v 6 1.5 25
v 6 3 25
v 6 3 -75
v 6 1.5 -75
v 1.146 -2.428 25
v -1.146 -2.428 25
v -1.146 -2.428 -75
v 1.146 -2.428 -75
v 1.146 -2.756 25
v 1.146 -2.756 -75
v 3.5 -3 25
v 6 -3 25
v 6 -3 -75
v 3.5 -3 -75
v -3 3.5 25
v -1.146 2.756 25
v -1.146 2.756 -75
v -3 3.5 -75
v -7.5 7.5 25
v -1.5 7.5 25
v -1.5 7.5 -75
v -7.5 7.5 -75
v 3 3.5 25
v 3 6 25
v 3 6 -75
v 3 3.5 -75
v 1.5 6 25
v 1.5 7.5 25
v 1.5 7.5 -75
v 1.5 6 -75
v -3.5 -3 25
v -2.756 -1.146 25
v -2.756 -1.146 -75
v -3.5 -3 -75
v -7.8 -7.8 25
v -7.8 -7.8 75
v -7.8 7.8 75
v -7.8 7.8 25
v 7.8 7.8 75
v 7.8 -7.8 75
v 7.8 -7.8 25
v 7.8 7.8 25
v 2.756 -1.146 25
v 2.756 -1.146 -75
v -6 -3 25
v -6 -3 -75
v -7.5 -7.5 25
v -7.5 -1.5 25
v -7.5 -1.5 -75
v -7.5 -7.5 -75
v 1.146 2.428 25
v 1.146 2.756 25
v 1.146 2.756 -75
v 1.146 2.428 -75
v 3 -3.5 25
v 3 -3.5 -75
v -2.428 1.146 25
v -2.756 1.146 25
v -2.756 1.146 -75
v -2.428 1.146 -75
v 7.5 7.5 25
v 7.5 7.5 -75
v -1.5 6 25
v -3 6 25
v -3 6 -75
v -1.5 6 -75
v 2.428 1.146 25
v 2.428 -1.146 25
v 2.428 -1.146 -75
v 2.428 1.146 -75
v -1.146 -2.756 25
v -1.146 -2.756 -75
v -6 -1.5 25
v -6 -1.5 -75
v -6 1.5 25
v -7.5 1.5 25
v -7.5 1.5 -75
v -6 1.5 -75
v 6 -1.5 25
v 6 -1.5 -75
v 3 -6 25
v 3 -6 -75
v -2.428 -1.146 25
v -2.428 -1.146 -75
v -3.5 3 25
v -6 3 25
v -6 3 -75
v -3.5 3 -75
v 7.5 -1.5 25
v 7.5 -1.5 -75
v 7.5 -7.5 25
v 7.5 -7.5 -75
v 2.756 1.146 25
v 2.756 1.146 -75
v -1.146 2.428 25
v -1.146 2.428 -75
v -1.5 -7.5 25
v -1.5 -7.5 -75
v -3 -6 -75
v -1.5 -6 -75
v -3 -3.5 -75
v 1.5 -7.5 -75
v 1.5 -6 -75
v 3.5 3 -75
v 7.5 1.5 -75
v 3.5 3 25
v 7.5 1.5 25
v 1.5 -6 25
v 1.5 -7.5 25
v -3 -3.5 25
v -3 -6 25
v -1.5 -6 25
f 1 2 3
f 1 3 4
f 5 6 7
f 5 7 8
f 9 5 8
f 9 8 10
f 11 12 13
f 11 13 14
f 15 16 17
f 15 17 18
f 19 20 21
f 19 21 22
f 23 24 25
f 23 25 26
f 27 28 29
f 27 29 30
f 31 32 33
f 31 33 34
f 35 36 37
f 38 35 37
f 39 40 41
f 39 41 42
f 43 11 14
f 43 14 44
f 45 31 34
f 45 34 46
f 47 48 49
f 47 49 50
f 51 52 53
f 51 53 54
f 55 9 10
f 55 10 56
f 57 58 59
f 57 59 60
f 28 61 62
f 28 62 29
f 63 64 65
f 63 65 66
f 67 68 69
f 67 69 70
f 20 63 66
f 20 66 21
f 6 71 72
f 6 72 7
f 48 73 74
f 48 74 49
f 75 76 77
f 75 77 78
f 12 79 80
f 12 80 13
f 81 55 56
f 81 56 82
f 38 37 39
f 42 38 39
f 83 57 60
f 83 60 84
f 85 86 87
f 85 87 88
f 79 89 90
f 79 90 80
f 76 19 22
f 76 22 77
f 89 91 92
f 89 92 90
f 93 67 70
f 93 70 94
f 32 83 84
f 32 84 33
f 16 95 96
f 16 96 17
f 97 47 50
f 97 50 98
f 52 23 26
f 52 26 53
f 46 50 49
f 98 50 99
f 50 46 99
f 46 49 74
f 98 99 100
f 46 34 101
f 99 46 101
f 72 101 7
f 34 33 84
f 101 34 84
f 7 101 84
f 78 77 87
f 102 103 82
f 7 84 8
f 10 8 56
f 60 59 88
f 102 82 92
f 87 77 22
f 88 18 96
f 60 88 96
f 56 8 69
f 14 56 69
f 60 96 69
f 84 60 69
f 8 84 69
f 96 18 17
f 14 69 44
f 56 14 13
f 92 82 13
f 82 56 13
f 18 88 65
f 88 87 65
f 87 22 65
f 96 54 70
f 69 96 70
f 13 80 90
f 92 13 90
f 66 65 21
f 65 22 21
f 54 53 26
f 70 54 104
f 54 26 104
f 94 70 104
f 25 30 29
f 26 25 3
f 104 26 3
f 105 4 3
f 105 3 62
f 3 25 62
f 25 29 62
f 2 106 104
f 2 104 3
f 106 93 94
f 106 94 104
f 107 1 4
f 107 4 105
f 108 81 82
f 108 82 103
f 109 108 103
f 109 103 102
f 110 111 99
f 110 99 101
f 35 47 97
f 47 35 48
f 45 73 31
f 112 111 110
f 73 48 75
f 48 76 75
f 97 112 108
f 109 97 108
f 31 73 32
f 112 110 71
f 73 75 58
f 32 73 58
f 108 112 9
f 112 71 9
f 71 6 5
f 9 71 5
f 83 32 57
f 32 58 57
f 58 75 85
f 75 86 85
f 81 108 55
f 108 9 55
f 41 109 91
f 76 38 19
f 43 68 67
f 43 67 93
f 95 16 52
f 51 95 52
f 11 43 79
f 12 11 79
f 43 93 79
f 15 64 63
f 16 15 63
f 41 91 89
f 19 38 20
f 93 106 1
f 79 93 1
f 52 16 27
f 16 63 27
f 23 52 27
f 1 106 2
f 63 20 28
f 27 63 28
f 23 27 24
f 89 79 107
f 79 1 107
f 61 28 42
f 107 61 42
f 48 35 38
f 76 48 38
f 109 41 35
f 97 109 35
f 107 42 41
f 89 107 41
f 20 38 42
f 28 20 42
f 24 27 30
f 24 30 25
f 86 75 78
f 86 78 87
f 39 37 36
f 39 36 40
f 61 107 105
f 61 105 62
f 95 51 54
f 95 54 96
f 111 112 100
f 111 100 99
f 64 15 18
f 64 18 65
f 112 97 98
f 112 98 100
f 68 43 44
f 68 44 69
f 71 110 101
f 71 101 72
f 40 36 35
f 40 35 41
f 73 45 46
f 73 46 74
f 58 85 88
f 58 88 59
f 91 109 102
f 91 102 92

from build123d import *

# Parameters (mm, degrees)
F1_DEPTH = 75
F2_W     = 15.6
F2_H     = 15.6
F3_DEPTH = 50


# Not quite as in the source:
# - ends of sketch curves that miss each other by under 0.0002 mm in the source are joined


with BuildPart() as f1:
    # F0 (on Top) → F1 (new body, symmetric)
    with BuildSketch(Plane.XY):
        Polygon((7.5, 1.5), (7.5, 7.5), (1.5, 7.5), (1.5, 6), (3, 6), (3, 3.5), (1.1461396934, 2.7563427575), (1.1461396934, 2.42764467), (-1.1461396934, 2.42764467), (-1.1461396934, 2.7563427575), (-3, 3.5), (-3, 6), (-1.5, 6), (-1.5, 7.5), (-7.5, 7.5), (-7.5, 1.5), (-6, 1.5), (-6, 3), (-3.5, 3), (-2.7563427575, 1.1461396934), (-2.42764467, 1.1461396934), (-2.42764467, -1.1461396934), (-2.7563427575, -1.1461396934), (-3.5, -3), (-6, -3), (-6, -1.5), (-7.5, -1.5), (-7.5, -7.5), (-1.5, -7.5), (-1.5, -6), (-3, -6), (-3, -3.5), (-1.1461396934, -2.7563427575), (-1.1461396934, -2.42764467), (1.1461396934, -2.42764467), (1.1461396934, -2.7563427575), (3, -3.5), (3, -6), (1.5, -6), (1.5, -7.5), (7.5, -7.5), (7.5, -1.5), (6, -1.5), (6, -3), (3.5, -3), (2.7563427575, -1.1461396934), (2.42764467, -1.1461396934), (2.42764467, 1.1461396934), (2.7563427575, 1.1461396934), (3.5, 3), (6, 3), (6, 1.5), align=None)
    extrude(amount=F1_DEPTH, both=True)

    # F2 (on face) → F3 (join)
    with BuildSketch(Plane.XY.offset(75)):
        Rectangle(F2_W, F2_H)
        Polygon((7.5, 7.5), (7.5, 1.5), (6, 1.5), (6, 3), (3.5, 3), (2.7563427575, 1.1461396934), (2.42764467, 1.1461396934), (2.42764467, -1.1461396934), (2.7563427575, -1.1461396934), (3.5, -3), (6, -3), (6, -1.5), (7.5, -1.5), (7.5, -7.5), (1.5, -7.5), (1.5, -6), (3, -6), (3, -3.5), (1.1461396934, -2.7563427575), (1.1461396934, -2.42764467), (-1.1461396934, -2.42764467), (-1.1461396934, -2.7563427575), (-3, -3.5), (-3, -6), (-1.5, -6), (-1.5, -7.5), (-7.5, -7.5), (-7.5, -1.5), (-6, -1.5), (-6, -3), (-3.5, -3), (-2.7563427575, -1.1461396934), (-2.42764467, -1.1461396934), (-2.42764467, 1.1461396934), (-2.7563427575, 1.1461396934), (-3.5, 3), (-6, 3), (-6, 1.5), (-7.5, 1.5), (-7.5, 7.5), (-1.5, 7.5), (-1.5, 6), (-3, 6), (-3, 3.5), (-1.1461396934, 2.7563427575), (-1.1461396934, 2.42764467), (1.1461396934, 2.42764467), (1.1461396934, 2.7563427575), (3, 3.5), (3, 6), (1.5, 6), (1.5, 7.5), align=None, mode=Mode.SUBTRACT)
    extrude(amount=-F3_DEPTH)


solid = f1.part
